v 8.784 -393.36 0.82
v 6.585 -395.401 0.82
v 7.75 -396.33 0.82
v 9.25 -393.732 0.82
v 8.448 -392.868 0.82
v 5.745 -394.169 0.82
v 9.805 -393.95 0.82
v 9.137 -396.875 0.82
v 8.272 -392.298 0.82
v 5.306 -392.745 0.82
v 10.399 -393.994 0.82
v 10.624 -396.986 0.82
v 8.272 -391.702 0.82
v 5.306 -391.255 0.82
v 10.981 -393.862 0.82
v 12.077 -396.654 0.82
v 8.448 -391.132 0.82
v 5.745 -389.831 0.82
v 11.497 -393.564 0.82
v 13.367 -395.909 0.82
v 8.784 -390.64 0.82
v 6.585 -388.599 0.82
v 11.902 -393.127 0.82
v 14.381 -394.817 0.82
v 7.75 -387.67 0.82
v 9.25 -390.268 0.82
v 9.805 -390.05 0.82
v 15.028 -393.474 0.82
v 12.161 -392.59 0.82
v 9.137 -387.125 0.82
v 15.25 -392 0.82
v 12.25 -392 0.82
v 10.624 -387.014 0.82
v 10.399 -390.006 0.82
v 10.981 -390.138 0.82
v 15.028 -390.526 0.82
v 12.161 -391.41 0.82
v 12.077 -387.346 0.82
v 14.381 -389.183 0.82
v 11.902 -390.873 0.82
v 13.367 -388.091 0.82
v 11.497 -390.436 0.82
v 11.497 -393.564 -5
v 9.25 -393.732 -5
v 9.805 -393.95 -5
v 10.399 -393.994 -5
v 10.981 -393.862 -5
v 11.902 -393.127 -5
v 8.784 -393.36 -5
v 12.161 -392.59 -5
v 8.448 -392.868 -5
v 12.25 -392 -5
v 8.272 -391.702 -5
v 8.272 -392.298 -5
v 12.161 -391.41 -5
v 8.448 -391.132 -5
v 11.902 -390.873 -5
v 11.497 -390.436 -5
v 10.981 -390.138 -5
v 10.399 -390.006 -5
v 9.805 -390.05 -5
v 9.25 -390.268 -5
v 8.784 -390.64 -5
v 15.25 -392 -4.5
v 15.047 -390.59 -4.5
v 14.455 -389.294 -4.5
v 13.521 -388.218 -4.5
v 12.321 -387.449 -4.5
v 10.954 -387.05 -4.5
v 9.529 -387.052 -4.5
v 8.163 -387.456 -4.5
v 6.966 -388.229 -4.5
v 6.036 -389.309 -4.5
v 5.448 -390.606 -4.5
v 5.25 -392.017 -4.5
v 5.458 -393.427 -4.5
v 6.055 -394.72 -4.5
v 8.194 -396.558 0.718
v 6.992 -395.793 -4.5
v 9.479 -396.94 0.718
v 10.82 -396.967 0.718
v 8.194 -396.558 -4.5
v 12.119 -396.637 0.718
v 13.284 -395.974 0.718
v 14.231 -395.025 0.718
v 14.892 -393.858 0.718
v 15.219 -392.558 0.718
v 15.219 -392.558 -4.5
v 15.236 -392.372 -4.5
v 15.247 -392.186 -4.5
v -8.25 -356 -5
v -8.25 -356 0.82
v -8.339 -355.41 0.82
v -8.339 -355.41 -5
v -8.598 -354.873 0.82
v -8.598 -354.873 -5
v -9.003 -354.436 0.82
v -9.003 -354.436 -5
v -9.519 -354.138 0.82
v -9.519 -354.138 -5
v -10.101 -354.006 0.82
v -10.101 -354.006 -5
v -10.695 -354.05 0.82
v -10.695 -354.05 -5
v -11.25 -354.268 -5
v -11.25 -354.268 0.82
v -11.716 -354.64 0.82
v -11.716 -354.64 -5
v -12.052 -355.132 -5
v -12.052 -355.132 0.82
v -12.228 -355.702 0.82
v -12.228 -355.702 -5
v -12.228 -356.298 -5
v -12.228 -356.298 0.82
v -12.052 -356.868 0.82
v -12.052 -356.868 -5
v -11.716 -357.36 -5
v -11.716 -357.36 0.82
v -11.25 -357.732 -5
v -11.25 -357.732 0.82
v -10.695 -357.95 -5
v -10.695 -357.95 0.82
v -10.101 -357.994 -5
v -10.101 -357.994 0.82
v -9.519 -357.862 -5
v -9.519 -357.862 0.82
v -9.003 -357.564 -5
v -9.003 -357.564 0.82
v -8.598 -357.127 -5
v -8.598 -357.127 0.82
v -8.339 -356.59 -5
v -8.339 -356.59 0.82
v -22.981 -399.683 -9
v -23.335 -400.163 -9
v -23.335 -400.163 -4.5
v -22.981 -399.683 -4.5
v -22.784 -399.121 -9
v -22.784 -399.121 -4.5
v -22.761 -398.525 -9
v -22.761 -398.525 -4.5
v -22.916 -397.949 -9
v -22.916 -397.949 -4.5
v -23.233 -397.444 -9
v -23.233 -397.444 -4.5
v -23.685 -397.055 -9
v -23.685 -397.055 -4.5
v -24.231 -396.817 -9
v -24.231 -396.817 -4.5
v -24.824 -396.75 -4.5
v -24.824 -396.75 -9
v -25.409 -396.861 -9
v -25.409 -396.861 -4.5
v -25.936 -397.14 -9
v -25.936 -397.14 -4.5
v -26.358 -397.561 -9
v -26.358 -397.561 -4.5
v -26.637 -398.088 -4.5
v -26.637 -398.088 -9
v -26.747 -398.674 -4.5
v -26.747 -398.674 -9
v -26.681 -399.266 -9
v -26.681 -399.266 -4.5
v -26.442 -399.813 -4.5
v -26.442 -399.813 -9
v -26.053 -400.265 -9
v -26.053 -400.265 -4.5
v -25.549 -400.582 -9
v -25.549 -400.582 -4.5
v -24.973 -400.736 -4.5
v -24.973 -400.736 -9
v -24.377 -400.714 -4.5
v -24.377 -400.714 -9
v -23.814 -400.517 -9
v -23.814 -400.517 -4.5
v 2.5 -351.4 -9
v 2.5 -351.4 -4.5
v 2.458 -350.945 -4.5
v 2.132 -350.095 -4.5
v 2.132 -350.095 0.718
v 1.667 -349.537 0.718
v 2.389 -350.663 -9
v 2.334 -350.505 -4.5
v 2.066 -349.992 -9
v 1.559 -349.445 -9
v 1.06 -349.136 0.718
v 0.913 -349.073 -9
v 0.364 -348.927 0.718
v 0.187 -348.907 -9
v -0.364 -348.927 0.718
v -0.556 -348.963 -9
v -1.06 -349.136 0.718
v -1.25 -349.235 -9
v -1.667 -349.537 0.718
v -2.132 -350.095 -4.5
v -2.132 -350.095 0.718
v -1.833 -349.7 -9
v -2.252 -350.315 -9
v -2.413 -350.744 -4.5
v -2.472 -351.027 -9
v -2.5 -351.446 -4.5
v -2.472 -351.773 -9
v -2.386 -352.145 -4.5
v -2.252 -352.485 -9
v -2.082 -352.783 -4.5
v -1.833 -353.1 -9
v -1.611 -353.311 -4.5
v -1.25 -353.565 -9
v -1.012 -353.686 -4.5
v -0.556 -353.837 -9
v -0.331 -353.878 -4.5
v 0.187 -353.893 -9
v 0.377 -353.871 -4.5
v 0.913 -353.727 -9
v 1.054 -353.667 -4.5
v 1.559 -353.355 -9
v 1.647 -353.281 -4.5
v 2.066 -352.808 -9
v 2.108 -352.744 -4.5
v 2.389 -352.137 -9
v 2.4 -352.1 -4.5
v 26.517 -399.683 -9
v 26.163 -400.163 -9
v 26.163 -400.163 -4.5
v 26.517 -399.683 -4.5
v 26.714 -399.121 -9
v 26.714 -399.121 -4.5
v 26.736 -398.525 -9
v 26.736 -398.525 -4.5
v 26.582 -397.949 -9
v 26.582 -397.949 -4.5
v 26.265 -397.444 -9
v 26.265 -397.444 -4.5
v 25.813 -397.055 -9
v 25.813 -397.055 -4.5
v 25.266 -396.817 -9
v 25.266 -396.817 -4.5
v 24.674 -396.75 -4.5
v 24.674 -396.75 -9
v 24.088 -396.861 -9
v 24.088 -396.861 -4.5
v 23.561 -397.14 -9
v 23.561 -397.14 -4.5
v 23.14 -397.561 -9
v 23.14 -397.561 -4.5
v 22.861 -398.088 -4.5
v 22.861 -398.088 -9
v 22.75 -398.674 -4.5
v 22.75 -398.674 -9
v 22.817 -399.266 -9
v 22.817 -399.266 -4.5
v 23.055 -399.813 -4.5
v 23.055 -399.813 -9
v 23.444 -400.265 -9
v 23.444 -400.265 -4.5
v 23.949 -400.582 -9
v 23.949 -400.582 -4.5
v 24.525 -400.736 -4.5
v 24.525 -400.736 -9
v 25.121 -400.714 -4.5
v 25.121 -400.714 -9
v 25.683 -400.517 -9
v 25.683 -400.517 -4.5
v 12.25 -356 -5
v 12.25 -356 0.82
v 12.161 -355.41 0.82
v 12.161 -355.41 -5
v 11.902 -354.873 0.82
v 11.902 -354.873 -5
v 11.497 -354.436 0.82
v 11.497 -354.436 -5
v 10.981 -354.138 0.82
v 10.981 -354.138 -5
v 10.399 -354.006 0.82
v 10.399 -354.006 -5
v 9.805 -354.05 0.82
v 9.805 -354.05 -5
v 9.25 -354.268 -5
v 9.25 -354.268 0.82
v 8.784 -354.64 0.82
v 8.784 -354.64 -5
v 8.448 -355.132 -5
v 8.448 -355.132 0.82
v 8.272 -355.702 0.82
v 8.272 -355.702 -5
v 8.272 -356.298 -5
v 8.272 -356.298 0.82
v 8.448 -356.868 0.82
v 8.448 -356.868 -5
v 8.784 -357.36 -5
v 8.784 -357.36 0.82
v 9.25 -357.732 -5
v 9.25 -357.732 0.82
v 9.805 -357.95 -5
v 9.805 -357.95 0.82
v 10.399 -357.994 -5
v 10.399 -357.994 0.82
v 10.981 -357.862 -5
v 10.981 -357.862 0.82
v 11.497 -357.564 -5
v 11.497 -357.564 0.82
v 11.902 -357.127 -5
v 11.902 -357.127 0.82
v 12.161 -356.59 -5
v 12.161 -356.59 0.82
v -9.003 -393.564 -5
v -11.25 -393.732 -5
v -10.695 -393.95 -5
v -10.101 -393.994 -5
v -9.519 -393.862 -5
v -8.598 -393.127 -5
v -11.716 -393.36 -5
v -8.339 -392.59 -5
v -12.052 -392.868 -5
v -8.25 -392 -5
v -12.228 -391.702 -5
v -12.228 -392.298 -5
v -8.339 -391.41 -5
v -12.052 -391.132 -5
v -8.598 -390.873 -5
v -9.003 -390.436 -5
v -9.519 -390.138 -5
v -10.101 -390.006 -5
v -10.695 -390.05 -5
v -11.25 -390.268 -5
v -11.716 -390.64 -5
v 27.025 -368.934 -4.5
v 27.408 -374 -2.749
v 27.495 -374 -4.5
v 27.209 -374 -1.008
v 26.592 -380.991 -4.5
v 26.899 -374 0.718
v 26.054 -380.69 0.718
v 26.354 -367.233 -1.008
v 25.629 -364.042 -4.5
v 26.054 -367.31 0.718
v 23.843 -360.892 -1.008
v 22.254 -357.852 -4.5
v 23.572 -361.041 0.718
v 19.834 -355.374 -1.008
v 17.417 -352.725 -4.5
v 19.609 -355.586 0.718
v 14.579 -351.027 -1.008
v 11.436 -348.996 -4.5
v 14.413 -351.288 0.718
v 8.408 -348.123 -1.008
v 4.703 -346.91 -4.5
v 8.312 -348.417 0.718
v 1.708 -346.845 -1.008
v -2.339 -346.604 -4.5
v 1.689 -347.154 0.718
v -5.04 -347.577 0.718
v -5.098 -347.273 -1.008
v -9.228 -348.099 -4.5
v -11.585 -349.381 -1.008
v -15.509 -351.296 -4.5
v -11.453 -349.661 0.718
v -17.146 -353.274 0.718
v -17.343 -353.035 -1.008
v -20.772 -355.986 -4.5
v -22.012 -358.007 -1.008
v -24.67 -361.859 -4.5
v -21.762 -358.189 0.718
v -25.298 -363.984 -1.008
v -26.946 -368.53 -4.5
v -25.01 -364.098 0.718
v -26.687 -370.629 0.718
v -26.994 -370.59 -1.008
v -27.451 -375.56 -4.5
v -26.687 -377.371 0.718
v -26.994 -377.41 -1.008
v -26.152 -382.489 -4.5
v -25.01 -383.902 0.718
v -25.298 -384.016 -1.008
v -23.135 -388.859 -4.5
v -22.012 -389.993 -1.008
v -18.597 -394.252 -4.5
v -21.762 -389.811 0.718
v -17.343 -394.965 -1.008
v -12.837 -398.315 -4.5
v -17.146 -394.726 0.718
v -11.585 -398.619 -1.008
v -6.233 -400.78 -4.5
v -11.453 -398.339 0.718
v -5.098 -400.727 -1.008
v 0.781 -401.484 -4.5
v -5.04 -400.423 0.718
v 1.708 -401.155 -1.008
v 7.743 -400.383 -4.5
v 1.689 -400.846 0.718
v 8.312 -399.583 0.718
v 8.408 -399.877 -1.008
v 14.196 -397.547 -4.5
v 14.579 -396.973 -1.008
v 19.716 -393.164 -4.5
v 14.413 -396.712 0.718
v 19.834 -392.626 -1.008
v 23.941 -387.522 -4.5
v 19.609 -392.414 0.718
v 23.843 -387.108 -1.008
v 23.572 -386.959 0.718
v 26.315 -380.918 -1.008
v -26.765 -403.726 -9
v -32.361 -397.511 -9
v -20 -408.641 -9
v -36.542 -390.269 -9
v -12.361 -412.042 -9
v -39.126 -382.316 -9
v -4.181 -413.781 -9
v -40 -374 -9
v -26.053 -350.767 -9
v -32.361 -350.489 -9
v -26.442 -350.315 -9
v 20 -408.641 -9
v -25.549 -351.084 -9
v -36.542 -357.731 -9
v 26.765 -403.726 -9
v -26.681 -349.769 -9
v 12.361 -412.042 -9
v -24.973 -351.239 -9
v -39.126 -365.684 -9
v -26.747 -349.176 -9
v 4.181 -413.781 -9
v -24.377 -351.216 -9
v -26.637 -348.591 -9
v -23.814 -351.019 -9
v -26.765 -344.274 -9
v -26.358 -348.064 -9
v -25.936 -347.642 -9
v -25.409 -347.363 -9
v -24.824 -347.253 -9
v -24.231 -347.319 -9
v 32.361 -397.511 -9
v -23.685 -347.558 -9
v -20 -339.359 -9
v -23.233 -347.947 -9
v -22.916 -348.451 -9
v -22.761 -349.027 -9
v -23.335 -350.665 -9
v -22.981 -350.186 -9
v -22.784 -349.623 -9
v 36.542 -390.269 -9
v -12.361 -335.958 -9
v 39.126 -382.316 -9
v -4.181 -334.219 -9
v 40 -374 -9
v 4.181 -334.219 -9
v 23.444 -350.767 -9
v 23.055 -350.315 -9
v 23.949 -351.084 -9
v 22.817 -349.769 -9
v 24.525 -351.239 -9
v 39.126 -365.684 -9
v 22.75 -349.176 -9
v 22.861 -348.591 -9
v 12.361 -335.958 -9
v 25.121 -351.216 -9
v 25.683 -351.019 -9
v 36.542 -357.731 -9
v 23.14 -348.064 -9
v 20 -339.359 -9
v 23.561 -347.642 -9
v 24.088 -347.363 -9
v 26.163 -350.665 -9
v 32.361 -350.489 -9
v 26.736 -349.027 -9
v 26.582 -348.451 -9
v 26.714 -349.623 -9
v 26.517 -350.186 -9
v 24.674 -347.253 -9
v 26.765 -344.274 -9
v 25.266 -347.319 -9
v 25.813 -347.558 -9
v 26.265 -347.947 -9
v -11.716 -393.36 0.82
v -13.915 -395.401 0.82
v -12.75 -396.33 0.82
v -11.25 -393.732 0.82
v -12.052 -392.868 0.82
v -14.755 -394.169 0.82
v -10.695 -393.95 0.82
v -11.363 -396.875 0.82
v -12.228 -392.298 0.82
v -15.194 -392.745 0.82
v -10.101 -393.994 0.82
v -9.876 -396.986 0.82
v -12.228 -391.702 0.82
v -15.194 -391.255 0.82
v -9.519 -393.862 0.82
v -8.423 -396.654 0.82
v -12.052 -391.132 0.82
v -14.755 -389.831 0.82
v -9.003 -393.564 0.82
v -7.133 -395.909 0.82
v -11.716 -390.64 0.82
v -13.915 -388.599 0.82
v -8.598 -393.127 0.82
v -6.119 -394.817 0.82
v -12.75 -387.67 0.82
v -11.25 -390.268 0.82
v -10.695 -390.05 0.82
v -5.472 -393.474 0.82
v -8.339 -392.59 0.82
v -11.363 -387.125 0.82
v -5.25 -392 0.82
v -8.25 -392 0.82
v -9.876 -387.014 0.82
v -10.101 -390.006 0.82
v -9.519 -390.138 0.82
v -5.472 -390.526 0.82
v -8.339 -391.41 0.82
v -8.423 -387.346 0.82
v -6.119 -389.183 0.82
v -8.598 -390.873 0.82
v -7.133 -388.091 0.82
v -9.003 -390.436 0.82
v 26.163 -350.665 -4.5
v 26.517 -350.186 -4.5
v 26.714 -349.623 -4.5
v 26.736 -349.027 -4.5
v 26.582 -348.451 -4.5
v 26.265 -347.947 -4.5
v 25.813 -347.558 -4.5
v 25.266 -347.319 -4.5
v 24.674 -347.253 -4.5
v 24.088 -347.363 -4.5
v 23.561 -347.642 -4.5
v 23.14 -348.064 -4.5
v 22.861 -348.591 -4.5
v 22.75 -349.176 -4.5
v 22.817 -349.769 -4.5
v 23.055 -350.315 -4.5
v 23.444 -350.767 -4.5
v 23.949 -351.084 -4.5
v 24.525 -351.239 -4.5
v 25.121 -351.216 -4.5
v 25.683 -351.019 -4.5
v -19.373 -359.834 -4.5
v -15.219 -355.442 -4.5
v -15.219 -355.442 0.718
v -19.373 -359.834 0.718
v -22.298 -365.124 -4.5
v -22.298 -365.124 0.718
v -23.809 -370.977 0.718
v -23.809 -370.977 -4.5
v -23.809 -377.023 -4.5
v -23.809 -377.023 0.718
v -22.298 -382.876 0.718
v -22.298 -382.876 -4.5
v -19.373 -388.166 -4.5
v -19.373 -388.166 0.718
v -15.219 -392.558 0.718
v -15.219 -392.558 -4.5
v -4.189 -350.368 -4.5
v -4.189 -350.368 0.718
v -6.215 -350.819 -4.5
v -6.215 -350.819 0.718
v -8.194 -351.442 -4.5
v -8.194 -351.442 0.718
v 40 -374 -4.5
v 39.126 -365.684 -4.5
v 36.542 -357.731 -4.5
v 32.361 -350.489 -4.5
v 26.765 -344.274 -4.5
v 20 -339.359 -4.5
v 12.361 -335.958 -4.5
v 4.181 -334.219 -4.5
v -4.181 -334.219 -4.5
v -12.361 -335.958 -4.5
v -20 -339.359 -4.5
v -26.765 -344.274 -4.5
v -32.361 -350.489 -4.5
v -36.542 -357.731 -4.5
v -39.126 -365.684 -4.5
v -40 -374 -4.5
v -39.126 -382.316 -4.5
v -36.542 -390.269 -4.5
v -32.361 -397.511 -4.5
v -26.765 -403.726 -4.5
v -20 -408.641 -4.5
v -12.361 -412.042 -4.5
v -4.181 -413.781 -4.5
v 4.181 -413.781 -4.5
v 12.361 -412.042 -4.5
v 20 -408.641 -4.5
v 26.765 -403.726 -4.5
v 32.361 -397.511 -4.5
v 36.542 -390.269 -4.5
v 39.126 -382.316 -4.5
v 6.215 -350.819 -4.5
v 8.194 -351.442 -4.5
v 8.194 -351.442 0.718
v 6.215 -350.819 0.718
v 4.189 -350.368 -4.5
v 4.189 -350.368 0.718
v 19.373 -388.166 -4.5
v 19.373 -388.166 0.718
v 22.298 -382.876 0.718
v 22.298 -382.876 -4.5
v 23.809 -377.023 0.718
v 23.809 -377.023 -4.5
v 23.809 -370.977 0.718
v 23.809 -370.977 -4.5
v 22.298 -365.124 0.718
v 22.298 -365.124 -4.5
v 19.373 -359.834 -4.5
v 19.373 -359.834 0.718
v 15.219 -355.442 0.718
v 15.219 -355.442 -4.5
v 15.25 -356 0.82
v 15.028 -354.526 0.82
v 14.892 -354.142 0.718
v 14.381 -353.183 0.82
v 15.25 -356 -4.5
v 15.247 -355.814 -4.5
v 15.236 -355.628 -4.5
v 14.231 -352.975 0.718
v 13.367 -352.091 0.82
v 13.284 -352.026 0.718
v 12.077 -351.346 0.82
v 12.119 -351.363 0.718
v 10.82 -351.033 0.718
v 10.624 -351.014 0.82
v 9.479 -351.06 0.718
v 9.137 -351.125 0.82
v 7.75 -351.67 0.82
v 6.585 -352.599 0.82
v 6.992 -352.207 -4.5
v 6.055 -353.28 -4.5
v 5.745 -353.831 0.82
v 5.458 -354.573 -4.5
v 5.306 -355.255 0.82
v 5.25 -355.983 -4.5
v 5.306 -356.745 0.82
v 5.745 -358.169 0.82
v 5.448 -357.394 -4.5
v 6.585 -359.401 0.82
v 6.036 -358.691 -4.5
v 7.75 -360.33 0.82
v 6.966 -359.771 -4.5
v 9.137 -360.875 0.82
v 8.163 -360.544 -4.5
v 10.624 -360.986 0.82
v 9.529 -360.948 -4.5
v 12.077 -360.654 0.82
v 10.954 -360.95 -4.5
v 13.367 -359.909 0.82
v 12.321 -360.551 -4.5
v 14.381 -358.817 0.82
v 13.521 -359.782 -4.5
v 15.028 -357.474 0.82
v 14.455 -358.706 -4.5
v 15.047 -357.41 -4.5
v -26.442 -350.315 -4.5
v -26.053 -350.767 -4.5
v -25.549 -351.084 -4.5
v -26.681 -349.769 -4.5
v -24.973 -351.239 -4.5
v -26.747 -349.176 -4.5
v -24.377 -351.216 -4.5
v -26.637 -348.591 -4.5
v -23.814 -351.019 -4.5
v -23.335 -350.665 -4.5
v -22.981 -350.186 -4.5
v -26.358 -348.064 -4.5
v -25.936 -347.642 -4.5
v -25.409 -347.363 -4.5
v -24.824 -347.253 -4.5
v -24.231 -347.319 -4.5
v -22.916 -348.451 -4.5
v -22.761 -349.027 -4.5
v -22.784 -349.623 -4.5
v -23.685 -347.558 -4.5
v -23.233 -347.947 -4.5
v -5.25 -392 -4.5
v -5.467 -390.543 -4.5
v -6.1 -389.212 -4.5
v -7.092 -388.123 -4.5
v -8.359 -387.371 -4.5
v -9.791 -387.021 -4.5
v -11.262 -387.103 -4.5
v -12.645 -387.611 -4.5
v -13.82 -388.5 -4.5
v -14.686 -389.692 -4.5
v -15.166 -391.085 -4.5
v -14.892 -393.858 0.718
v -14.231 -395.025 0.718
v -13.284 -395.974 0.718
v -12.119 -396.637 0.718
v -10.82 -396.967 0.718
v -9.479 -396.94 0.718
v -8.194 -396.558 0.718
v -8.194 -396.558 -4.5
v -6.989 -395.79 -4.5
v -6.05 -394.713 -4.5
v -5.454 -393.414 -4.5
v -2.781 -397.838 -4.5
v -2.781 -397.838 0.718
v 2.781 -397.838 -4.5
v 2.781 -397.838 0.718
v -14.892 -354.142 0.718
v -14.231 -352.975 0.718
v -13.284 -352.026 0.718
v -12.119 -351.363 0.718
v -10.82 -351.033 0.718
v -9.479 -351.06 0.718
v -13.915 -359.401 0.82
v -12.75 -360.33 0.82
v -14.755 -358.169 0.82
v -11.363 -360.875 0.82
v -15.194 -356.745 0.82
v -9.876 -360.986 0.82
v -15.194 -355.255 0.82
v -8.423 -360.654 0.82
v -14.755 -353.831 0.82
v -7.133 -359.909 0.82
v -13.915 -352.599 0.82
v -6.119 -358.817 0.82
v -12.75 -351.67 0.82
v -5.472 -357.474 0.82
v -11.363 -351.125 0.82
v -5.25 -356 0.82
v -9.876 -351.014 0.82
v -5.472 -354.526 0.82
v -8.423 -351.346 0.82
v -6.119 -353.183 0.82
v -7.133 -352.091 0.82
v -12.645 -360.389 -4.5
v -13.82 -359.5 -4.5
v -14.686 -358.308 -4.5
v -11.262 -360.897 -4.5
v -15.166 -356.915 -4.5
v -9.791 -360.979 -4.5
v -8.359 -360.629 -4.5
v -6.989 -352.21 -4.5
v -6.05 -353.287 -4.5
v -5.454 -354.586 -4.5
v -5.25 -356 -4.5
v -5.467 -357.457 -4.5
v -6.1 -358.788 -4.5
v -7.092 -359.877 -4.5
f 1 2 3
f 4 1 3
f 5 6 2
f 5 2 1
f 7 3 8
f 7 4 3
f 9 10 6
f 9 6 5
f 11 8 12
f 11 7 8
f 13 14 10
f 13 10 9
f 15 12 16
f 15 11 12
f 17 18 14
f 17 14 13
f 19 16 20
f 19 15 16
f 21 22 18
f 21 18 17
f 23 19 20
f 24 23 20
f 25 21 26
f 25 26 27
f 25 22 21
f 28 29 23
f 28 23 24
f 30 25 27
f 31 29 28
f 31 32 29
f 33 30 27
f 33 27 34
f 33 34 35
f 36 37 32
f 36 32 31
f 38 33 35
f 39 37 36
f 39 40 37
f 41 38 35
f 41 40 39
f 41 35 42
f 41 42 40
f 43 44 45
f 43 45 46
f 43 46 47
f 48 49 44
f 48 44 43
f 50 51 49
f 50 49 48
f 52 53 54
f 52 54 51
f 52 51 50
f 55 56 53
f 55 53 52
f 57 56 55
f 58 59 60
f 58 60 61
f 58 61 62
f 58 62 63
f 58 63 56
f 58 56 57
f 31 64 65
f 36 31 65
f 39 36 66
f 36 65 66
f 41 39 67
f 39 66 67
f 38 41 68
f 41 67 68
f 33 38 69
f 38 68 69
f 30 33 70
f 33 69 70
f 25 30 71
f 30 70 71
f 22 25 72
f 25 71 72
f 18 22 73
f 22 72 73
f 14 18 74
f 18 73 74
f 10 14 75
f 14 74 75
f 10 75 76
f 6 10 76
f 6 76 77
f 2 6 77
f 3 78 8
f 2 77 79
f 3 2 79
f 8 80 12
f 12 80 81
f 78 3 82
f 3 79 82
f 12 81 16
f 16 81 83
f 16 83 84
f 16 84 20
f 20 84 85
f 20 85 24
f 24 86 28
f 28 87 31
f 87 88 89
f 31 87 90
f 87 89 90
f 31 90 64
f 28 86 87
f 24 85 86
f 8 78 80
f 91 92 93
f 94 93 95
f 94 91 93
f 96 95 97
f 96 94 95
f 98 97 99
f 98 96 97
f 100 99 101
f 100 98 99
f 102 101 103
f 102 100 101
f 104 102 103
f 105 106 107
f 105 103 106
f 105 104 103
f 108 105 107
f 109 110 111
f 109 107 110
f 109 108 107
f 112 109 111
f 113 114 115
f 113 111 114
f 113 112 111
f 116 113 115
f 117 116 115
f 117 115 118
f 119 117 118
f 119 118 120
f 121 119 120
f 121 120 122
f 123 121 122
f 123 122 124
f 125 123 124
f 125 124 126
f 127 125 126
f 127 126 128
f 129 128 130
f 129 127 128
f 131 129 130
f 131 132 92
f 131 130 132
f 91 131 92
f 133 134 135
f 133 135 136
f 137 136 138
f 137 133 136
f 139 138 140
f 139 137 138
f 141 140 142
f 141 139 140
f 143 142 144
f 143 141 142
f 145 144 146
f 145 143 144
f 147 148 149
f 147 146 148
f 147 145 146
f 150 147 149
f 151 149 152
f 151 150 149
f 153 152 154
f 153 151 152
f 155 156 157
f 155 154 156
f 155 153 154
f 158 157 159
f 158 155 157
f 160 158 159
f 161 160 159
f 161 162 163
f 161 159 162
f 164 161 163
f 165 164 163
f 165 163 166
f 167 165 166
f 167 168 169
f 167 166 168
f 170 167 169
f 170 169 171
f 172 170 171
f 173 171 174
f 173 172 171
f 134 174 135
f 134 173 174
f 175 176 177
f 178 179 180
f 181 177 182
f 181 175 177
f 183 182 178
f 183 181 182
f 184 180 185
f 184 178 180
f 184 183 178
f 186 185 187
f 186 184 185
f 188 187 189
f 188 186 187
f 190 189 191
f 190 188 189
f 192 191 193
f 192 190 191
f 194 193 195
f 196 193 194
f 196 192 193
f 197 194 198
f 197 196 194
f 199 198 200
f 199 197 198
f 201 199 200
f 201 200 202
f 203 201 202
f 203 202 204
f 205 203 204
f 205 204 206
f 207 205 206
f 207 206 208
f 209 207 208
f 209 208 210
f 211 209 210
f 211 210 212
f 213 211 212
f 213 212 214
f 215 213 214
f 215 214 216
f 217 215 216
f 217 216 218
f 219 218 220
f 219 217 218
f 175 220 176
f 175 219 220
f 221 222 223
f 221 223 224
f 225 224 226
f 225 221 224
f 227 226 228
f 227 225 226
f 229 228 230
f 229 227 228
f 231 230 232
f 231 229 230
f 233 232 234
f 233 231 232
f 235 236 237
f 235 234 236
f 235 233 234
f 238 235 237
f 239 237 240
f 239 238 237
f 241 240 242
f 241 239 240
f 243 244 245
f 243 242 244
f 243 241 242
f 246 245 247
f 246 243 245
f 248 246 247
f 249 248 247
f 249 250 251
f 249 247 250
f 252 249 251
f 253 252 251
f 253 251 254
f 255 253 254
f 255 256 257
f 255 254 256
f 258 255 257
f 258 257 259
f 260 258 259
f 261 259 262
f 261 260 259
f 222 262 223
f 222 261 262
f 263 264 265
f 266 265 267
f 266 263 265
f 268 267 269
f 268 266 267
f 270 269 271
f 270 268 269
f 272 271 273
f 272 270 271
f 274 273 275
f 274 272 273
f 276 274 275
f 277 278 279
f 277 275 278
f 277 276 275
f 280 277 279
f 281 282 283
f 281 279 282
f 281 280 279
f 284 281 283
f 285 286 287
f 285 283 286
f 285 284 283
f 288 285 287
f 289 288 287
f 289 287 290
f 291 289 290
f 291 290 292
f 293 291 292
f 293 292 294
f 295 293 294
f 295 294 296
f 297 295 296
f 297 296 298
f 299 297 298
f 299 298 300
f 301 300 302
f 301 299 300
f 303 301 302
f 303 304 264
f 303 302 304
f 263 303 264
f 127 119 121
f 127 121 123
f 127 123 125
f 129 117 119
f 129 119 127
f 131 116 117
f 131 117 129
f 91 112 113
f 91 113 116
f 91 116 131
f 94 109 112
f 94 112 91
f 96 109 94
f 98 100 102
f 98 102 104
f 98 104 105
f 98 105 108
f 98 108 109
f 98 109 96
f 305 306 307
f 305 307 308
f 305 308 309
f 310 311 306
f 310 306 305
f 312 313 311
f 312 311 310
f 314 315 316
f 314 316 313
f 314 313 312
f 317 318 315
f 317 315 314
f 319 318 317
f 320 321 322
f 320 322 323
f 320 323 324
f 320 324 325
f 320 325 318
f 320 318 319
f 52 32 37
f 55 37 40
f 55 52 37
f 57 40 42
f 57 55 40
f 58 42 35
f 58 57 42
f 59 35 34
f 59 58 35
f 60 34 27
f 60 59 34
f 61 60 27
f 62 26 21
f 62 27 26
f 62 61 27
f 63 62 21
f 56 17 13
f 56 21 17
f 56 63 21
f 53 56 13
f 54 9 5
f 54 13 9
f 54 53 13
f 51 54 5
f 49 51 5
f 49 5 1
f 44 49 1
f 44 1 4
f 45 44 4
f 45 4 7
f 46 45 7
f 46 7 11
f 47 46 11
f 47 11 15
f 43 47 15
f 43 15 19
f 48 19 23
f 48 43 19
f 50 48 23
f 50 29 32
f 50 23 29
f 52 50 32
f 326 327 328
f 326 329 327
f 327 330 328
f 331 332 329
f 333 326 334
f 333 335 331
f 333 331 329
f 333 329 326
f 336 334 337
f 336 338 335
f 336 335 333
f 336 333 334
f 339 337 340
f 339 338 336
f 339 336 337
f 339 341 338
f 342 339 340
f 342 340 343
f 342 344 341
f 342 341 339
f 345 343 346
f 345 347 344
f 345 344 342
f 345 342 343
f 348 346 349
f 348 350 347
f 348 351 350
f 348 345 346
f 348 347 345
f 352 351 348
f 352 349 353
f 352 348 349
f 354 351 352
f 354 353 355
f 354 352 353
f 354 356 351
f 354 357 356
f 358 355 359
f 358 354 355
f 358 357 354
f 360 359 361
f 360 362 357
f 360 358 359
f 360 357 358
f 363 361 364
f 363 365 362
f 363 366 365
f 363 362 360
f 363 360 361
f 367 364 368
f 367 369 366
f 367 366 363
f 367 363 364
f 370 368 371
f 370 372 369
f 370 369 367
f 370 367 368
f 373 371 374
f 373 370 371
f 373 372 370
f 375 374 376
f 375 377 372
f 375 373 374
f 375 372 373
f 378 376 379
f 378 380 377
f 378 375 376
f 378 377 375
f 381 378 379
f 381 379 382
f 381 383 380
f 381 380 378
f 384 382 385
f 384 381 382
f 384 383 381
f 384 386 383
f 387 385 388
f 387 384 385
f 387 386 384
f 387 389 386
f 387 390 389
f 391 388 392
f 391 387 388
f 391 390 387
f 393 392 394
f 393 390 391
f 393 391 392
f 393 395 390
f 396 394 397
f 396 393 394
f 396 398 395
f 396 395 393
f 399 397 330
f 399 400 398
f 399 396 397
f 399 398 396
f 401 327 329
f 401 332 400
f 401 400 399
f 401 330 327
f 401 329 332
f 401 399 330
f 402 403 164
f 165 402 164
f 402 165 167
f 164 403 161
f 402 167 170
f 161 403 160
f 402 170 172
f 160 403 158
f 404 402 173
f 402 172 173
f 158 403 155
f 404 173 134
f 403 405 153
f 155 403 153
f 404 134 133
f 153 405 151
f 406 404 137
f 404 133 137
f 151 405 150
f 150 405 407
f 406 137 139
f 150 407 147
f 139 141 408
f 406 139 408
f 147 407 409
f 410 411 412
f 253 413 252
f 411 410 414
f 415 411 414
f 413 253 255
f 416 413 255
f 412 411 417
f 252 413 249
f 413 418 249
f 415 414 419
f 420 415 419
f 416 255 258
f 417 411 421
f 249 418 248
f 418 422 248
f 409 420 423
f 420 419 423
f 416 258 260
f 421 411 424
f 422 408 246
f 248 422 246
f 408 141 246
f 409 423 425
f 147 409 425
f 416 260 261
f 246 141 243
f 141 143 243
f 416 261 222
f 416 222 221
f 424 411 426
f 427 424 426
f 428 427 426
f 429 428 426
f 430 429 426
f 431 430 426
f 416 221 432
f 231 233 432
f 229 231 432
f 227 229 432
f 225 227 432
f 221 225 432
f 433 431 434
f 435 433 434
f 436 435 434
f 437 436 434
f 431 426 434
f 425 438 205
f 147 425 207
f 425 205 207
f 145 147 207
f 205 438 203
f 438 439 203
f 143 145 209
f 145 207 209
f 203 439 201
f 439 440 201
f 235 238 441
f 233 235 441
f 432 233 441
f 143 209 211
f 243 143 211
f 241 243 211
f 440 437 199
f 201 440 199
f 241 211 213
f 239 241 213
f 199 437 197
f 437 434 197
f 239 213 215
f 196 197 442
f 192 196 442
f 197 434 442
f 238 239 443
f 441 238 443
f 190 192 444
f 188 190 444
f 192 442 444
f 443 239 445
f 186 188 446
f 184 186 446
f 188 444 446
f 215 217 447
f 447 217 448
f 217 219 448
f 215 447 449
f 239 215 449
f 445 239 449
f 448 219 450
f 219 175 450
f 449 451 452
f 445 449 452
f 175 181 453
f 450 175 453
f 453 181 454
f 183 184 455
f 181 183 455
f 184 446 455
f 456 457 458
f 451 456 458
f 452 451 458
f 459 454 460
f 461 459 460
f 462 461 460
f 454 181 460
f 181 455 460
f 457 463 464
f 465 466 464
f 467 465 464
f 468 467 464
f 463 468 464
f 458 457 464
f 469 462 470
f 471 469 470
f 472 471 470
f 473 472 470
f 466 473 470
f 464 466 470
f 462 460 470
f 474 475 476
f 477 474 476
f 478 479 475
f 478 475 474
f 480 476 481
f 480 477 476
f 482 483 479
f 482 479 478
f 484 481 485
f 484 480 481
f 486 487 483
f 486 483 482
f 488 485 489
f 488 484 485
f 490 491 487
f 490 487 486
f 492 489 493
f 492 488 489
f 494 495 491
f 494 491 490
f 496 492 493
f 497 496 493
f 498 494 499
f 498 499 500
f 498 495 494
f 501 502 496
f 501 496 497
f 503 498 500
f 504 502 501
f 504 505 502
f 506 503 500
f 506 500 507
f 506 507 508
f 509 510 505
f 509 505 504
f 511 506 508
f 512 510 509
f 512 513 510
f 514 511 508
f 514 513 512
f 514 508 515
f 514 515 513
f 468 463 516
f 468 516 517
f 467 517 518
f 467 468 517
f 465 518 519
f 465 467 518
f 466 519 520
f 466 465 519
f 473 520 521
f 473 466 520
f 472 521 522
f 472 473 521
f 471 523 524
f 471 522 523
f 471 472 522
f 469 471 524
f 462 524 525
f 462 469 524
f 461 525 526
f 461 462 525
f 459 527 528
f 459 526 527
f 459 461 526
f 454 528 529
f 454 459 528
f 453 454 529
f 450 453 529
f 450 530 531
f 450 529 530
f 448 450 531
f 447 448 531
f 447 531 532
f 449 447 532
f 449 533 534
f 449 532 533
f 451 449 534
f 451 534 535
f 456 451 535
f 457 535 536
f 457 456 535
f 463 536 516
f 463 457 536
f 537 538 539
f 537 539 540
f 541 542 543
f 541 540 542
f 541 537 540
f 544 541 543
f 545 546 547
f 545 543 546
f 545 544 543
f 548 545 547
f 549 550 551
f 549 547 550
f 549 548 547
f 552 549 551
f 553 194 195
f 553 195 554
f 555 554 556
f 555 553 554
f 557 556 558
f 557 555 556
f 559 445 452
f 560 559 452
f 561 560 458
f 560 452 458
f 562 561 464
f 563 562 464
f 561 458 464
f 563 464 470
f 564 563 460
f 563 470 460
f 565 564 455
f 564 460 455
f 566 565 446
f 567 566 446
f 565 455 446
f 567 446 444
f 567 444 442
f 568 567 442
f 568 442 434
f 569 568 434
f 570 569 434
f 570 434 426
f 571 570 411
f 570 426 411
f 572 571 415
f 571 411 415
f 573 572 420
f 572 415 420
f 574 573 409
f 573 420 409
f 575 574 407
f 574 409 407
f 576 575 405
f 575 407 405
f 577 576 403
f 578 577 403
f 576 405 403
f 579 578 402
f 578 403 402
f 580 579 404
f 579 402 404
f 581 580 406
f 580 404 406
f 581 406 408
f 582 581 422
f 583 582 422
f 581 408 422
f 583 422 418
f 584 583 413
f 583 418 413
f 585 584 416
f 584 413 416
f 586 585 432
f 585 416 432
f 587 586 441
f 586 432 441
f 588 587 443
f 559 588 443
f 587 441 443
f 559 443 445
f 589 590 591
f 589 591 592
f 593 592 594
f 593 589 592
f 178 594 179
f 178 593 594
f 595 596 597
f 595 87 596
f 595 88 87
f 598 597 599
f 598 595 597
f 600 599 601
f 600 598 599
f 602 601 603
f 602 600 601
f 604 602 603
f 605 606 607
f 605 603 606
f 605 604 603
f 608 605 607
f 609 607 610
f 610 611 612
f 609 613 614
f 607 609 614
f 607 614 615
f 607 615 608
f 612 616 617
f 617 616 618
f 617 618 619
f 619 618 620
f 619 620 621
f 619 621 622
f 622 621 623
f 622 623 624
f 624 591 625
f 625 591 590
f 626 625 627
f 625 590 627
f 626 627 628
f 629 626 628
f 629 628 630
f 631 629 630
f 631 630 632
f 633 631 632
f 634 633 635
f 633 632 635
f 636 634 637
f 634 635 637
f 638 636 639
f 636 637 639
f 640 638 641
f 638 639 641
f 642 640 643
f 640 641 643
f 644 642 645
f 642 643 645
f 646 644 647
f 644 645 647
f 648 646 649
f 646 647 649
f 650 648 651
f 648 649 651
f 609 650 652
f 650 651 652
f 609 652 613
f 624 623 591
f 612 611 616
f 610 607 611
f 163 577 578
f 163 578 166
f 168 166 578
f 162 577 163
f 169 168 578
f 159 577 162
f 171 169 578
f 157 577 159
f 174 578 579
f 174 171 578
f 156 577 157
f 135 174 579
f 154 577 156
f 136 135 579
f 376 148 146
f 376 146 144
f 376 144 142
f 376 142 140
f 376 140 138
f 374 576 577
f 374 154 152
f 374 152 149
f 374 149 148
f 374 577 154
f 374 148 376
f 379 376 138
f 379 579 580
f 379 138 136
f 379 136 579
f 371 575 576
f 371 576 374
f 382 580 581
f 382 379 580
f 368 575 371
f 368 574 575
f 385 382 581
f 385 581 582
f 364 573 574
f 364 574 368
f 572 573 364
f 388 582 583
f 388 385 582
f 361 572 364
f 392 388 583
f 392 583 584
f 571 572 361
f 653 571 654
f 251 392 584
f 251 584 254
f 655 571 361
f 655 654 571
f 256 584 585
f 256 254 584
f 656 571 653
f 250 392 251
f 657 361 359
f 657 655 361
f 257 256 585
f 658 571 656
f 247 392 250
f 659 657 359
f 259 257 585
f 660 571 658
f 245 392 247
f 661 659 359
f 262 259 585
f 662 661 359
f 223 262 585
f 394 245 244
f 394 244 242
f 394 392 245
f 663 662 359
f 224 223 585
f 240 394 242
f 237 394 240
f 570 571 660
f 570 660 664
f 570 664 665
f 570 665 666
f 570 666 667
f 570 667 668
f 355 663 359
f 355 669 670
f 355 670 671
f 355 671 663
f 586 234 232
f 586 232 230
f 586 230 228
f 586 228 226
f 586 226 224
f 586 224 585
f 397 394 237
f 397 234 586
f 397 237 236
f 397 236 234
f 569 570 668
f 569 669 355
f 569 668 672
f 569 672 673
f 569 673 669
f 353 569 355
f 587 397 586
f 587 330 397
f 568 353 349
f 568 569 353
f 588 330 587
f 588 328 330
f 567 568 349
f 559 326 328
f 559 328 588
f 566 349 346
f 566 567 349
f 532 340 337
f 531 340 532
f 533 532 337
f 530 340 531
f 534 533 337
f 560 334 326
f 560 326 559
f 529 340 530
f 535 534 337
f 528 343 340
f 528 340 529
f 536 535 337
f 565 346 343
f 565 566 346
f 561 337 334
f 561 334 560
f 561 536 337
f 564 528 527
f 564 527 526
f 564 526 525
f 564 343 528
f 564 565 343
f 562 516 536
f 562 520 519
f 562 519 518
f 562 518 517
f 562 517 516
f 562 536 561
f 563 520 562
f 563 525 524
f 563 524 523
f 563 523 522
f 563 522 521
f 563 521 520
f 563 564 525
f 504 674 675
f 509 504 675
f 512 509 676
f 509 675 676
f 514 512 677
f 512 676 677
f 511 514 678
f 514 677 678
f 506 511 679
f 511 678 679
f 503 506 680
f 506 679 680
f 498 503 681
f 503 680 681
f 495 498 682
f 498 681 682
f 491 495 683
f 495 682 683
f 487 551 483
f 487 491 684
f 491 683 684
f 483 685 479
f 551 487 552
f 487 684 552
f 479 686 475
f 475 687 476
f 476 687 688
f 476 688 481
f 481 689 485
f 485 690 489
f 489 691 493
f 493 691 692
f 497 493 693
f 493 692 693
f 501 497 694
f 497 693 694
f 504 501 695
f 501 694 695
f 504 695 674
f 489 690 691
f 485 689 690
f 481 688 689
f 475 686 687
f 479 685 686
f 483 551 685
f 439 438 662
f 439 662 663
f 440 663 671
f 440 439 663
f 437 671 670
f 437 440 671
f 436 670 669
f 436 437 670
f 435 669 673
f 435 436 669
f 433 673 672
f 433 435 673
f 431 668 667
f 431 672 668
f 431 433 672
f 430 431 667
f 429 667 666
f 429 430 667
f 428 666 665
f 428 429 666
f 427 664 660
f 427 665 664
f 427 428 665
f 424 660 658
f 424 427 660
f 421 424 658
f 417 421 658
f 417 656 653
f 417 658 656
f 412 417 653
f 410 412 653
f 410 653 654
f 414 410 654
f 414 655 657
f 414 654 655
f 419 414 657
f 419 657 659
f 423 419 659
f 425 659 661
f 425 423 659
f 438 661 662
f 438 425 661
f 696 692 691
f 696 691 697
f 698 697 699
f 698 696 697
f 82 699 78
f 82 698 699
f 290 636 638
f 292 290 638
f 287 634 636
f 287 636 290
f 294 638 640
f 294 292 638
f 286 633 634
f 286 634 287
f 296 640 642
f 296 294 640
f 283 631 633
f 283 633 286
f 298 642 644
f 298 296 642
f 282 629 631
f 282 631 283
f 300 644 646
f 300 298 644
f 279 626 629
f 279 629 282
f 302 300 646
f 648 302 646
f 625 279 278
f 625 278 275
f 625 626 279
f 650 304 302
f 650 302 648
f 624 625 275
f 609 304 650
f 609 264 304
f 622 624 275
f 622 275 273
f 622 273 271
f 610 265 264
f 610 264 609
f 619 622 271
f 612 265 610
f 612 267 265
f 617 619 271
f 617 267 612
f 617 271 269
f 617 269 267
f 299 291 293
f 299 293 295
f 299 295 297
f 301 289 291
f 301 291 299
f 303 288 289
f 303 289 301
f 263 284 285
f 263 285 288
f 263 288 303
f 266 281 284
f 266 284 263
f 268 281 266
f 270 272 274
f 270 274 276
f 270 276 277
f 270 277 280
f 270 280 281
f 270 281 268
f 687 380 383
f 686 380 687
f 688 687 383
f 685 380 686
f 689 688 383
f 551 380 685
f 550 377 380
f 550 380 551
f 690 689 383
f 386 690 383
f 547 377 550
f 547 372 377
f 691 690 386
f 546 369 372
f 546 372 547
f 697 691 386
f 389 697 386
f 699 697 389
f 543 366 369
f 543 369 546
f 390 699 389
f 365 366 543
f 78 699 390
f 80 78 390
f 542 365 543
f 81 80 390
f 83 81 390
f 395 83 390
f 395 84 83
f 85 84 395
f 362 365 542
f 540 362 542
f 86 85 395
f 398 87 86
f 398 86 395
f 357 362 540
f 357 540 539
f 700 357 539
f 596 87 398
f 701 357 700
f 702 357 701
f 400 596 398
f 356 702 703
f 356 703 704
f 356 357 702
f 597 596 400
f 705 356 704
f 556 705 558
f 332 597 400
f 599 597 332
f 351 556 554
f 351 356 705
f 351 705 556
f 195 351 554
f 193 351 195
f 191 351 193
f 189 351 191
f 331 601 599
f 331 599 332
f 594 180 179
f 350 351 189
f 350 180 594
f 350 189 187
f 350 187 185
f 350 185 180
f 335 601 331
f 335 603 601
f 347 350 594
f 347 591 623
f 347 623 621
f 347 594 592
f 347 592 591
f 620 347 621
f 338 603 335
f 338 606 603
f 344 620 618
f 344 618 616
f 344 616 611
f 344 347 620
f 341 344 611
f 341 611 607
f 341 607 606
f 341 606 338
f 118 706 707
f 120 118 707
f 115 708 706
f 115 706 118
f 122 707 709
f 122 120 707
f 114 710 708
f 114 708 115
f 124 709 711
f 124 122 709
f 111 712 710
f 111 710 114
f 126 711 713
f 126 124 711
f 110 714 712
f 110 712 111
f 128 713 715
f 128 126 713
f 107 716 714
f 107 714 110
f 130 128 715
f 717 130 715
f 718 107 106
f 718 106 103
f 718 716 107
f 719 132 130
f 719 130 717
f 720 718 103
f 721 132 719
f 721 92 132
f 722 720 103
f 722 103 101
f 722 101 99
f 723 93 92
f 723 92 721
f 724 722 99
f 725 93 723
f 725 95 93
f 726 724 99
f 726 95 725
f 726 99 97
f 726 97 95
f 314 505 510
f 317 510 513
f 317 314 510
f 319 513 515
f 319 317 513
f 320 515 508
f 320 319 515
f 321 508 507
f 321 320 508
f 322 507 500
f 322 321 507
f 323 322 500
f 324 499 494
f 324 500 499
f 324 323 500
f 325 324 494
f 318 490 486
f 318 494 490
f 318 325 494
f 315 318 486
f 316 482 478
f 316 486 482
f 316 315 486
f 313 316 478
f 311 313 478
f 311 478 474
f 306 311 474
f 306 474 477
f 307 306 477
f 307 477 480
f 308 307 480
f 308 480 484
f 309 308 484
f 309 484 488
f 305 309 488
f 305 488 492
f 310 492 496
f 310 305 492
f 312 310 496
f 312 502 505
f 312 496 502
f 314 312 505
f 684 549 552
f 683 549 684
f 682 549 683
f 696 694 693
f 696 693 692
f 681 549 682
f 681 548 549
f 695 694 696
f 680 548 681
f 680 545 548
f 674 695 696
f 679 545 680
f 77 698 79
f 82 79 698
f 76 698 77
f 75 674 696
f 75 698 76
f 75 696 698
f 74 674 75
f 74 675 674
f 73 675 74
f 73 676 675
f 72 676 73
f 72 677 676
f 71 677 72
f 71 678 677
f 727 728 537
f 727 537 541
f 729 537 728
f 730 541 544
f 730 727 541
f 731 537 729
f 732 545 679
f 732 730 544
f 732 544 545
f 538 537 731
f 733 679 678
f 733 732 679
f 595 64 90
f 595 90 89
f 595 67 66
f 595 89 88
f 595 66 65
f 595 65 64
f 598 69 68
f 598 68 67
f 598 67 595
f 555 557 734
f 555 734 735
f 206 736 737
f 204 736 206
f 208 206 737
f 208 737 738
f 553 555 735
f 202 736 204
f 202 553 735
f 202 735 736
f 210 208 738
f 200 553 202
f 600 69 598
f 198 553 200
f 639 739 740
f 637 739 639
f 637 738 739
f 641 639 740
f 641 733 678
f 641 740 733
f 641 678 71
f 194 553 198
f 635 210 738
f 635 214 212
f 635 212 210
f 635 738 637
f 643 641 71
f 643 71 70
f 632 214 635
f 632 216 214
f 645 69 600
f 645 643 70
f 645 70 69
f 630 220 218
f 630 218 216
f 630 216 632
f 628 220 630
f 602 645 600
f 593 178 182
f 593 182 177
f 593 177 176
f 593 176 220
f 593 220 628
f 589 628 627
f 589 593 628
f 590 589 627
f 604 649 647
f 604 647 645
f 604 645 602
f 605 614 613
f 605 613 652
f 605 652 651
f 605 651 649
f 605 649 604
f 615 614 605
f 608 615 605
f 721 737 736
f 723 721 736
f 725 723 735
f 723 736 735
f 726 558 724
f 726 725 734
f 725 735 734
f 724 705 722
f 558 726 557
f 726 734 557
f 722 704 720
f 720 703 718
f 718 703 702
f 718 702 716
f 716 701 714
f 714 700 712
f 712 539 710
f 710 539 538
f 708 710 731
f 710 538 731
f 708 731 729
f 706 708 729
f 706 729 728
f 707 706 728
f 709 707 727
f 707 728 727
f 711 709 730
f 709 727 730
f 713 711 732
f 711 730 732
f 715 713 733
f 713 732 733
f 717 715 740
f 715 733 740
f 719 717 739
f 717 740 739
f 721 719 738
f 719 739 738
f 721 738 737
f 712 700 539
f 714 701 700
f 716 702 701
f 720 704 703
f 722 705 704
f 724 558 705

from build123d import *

# Parameters (mm, degrees)
CYLINDER170_R             = 2
CYLINDER170_DEPTH         = 10
CYLINDER171_R             = 2
CYLINDER171_DEPTH         = 10
CYLINDER172_R             = 2
CYLINDER172_DEPTH         = 10
CYLINDER169_R             = 2
CYLINDER169_DEPTH         = 10
FUSION111_PLACEMENT_ANGLE = 45
CYLINDER165_R             = 2.5
CYLINDER165_DEPTH         = 60
CYLINDER161_R             = 2
CYLINDER161_DEPTH         = 10
CYLINDER162_R             = 2
CYLINDER162_DEPTH         = 10
CYLINDER163_R             = 2
CYLINDER163_DEPTH         = 10
CYLINDER164_R             = 2
CYLINDER164_DEPTH         = 10
CYLINDER156_R             = 5.5
CYLINDER156_DEPTH         = 1
CYLINDER157_R             = 5
CYLINDER157_DEPTH         = 5.82
CYLINDER158_R             = 5
CYLINDER158_DEPTH         = 5.82
CYLINDER159_R             = 5
CYLINDER159_DEPTH         = 5.82
CYLINDER160_R             = 5
CYLINDER160_DEPTH         = 5.82
CYLINDER154_R             = 40
CYLINDER154_DEPTH         = 4.5
CYLINDER155_R             = 24
CYLINDER155_DEPTH         = 7


with BuildPart() as m2heatsetinsets021:
    # Cylinder170 → Cylinder170 (new body)
    with BuildSketch(Plane(origin=(35, 0, 65), x_dir=(1, 0, 0), z_dir=(0, 0, 1))):
        Circle(CYLINDER170_R)
    extrude(amount=CYLINDER170_DEPTH)


with BuildPart() as m2heatsetinsets022:
    # Cylinder171 → Cylinder171 (new body)
    with BuildSketch(Plane(origin=(0, 35, 65), x_dir=(1, 0, 0), z_dir=(0, 0, 1))):
        Circle(CYLINDER171_R)
    extrude(amount=CYLINDER171_DEPTH)


with BuildPart() as m2heatsetinsets023:
    # Cylinder172 → Cylinder172 (new body)
    with BuildSketch(Plane(origin=(0, -35, 65), x_dir=(1, 0, 0), z_dir=(0, 0, 1))):
        Circle(CYLINDER172_R)
    extrude(amount=CYLINDER172_DEPTH)


with BuildPart() as fusion111:
    # Cylinder169 → Cylinder169 (new body)
    with BuildSketch(Plane(origin=(-35, 0, 65), x_dir=(1, 0, 0), z_dir=(0, 0, 1))):
        Circle(CYLINDER169_R)
    extrude(amount=CYLINDER169_DEPTH)

    # Fusion111: union m2HeatSetInsets021, m2HeatSetInsets022, m2HeatSetInsets023
    add(m2heatsetinsets021.part)
    add(m2heatsetinsets022.part)
    add(m2heatsetinsets023.part)


with BuildPart() as fusion111_1:
    # Fusion111 placement: moved
    add(fusion111.part.moved(Location((0, -374, -75))).rotate(Axis((0, -374, -75), (0, 0, -1)), FUSION111_PLACEMENT_ANGLE))


with BuildPart() as wirecut004:
    # Cylinder165 → Cylinder165 (new body)
    with BuildSketch(Plane(origin=(134, 32.6, 20), x_dir=(1, 0, 0), z_dir=(0, 0, 1))):
        Circle(CYLINDER165_R)
    extrude(amount=CYLINDER165_DEPTH)


with BuildPart() as cylinder161:
    # Cylinder161 → Cylinder161 (new body)
    with BuildSketch(Plane(origin=(0, -21, 0), x_dir=(1, 0, 0), z_dir=(0, 0, 1))):
        Circle(CYLINDER161_R)
    extrude(amount=CYLINDER161_DEPTH)


with BuildPart() as m3heatsetcuts025:
    # Cylinder162 → Cylinder162 (new body)
    with BuildSketch(Plane(origin=(20.5, -21, 0), x_dir=(1, 0, 0), z_dir=(0, 0, 1))):
        Circle(CYLINDER162_R)
    extrude(amount=CYLINDER162_DEPTH)

    # Fusion103: union Cylinder161
    add(cylinder161.part)


with BuildPart() as m3heatsetcuts025_1:
    # Fusion103 placement: moved
    add(m3heatsetcuts025.part.moved(Location((-5, 39, 70))))


with BuildPart() as cylinder163:
    # Cylinder163 → Cylinder163 (new body)
    with BuildSketch(Plane(origin=(0, -21, 0), x_dir=(1, 0, 0), z_dir=(0, 0, 1))):
        Circle(CYLINDER163_R)
    extrude(amount=CYLINDER163_DEPTH)


with BuildPart() as lightmodulecut005:
    # Cylinder164 → Cylinder164 (new body)
    with BuildSketch(Plane(origin=(20.5, -21, 0), x_dir=(1, 0, 0), z_dir=(0, 0, 1))):
        Circle(CYLINDER164_R)
    extrude(amount=CYLINDER164_DEPTH)

    # Fusion104: union Cylinder163
    add(cylinder163.part)


with BuildPart() as lightmodulecut005_1:
    # Fusion104 placement: moved
    add(lightmodulecut005.part.moved(Location((-5, 3, 70))))

    # Fusion102: union m3HeatSetCuts025
    add(m3heatsetcuts025_1.part)


with BuildPart() as lightmodulecut005_2:
    # Fusion102 placement: moved
    add(lightmodulecut005_1.part.moved(Location((128.75, 10, -1))))

    # Fusion105: union WireCut004
    add(wirecut004.part)


with BuildPart() as cylinder156:
    # Cylinder156 → Cylinder156 (new body)
    with BuildSketch(Plane(origin=(134, 32.6, 65), x_dir=(1, 0, 0), z_dir=(0, 0, 1))):
        Circle(CYLINDER156_R)
    extrude(amount=CYLINDER156_DEPTH)


with BuildPart() as cylinder157:
    # Cylinder157 → Cylinder157 (new body)
    with BuildSketch(Plane(origin=(0, -21, 0), x_dir=(1, 0, 0), z_dir=(0, 0, 1))):
        Circle(CYLINDER157_R)
    extrude(amount=CYLINDER157_DEPTH)


with BuildPart() as m3heatsetcuts021:
    # Cylinder158 → Cylinder158 (new body)
    with BuildSketch(Plane(origin=(20.5, -21, 0), x_dir=(1, 0, 0), z_dir=(0, 0, 1))):
        Circle(CYLINDER158_R)
    extrude(amount=CYLINDER158_DEPTH)

    # Fusion097: union Cylinder157
    add(cylinder157.part)


with BuildPart() as m3heatsetcuts021_1:
    # Fusion097 placement: moved
    add(m3heatsetcuts021.part.moved(Location((-5, 39, 70))))


with BuildPart() as cylinder159:
    # Cylinder159 → Cylinder159 (new body)
    with BuildSketch(Plane(origin=(0, -21, 0), x_dir=(1, 0, 0), z_dir=(0, 0, 1))):
        Circle(CYLINDER159_R)
    extrude(amount=CYLINDER159_DEPTH)


with BuildPart() as m3heatsetcuts023:
    # Cylinder160 → Cylinder160 (new body)
    with BuildSketch(Plane(origin=(20.5, -21, 0), x_dir=(1, 0, 0), z_dir=(0, 0, 1))):
        Circle(CYLINDER160_R)
    extrude(amount=CYLINDER160_DEPTH)

    # Fusion098: union Cylinder159
    add(cylinder159.part)


with BuildPart() as m3heatsetcuts023_1:
    # Fusion098 placement: moved
    add(m3heatsetcuts023.part.moved(Location((-5, 3, 70))))

    # Fusion099: union m3HeatSetCuts021
    add(m3heatsetcuts021_1.part)


with BuildPart() as m3heatsetcuts023_2:
    # Fusion099 placement: moved
    add(m3heatsetcuts023_1.part.moved(Location((128.75, 10, -1))))


with BuildPart() as base014:
    # Cylinder154 → Cylinder154 (new body)
    with BuildSketch(Plane(origin=(136, 0, 65), x_dir=(1, 0, 0), z_dir=(0, 0, 1))):
        Circle(CYLINDER154_R)
    extrude(amount=CYLINDER154_DEPTH)


with BuildPart() as basecut003:
    # Cylinder155 → Cylinder155 (new body)
    with BuildSketch(Plane(origin=(5, 0, 74), x_dir=(1, 0, 0), z_dir=(0, 0, 1))):
        Circle(CYLINDER155_R)
    extrude(amount=CYLINDER155_DEPTH)


with BuildPart() as cut058:
    # Sphere005 → Sphere005 (revolve)
    with BuildSketch(Plane(origin=(5, 0, 74), x_dir=(1, 0, 0), z_dir=(0, -1, 0))):
        with BuildLine():
            ThreePointArc((27.5, 0), (27.349352, 2.874533), (26.899059, 5.717571))
            Line((26.899059, 5.717571), (0, 5.717571))
            Line((0, 5.717571), (0, 0))
            Line((0, 0), (27.5, 0))
        make_face()
    revolve(axis=Axis((5, 0, 74), (0, 0, 1)))

    # Cut053: cut baseCut003
    add(basecut003.part, mode=Mode.SUBTRACT)


with BuildPart() as cut058_1:
    # Cut053 placement: moved
    add(cut058.part.moved(Location((131, 0, -5))))

    # Fusion100: union base014
    add(base014.part)


with BuildPart() as cut058_2:
    # Fusion100 placement: moved
    add(cut058_1.part.moved(Location((-2, 10, 0))))

    # Fusion101: union Cylinder156, m3HeatSetCuts023
    add(cylinder156.part)
    add(m3heatsetcuts023_2.part)

    # Cut054: cut lightModuleCut005
    add(lightmodulecut005_2.part, mode=Mode.SUBTRACT)


with BuildPart() as cut058_3:
    # Cut054 placement: moved
    add(cut058_2.part.moved(Location((-134, -384, -74))))

    # Cut058: cut Fusion111
    add(fusion111_1.part, mode=Mode.SUBTRACT)


solid = cut058_3.part
